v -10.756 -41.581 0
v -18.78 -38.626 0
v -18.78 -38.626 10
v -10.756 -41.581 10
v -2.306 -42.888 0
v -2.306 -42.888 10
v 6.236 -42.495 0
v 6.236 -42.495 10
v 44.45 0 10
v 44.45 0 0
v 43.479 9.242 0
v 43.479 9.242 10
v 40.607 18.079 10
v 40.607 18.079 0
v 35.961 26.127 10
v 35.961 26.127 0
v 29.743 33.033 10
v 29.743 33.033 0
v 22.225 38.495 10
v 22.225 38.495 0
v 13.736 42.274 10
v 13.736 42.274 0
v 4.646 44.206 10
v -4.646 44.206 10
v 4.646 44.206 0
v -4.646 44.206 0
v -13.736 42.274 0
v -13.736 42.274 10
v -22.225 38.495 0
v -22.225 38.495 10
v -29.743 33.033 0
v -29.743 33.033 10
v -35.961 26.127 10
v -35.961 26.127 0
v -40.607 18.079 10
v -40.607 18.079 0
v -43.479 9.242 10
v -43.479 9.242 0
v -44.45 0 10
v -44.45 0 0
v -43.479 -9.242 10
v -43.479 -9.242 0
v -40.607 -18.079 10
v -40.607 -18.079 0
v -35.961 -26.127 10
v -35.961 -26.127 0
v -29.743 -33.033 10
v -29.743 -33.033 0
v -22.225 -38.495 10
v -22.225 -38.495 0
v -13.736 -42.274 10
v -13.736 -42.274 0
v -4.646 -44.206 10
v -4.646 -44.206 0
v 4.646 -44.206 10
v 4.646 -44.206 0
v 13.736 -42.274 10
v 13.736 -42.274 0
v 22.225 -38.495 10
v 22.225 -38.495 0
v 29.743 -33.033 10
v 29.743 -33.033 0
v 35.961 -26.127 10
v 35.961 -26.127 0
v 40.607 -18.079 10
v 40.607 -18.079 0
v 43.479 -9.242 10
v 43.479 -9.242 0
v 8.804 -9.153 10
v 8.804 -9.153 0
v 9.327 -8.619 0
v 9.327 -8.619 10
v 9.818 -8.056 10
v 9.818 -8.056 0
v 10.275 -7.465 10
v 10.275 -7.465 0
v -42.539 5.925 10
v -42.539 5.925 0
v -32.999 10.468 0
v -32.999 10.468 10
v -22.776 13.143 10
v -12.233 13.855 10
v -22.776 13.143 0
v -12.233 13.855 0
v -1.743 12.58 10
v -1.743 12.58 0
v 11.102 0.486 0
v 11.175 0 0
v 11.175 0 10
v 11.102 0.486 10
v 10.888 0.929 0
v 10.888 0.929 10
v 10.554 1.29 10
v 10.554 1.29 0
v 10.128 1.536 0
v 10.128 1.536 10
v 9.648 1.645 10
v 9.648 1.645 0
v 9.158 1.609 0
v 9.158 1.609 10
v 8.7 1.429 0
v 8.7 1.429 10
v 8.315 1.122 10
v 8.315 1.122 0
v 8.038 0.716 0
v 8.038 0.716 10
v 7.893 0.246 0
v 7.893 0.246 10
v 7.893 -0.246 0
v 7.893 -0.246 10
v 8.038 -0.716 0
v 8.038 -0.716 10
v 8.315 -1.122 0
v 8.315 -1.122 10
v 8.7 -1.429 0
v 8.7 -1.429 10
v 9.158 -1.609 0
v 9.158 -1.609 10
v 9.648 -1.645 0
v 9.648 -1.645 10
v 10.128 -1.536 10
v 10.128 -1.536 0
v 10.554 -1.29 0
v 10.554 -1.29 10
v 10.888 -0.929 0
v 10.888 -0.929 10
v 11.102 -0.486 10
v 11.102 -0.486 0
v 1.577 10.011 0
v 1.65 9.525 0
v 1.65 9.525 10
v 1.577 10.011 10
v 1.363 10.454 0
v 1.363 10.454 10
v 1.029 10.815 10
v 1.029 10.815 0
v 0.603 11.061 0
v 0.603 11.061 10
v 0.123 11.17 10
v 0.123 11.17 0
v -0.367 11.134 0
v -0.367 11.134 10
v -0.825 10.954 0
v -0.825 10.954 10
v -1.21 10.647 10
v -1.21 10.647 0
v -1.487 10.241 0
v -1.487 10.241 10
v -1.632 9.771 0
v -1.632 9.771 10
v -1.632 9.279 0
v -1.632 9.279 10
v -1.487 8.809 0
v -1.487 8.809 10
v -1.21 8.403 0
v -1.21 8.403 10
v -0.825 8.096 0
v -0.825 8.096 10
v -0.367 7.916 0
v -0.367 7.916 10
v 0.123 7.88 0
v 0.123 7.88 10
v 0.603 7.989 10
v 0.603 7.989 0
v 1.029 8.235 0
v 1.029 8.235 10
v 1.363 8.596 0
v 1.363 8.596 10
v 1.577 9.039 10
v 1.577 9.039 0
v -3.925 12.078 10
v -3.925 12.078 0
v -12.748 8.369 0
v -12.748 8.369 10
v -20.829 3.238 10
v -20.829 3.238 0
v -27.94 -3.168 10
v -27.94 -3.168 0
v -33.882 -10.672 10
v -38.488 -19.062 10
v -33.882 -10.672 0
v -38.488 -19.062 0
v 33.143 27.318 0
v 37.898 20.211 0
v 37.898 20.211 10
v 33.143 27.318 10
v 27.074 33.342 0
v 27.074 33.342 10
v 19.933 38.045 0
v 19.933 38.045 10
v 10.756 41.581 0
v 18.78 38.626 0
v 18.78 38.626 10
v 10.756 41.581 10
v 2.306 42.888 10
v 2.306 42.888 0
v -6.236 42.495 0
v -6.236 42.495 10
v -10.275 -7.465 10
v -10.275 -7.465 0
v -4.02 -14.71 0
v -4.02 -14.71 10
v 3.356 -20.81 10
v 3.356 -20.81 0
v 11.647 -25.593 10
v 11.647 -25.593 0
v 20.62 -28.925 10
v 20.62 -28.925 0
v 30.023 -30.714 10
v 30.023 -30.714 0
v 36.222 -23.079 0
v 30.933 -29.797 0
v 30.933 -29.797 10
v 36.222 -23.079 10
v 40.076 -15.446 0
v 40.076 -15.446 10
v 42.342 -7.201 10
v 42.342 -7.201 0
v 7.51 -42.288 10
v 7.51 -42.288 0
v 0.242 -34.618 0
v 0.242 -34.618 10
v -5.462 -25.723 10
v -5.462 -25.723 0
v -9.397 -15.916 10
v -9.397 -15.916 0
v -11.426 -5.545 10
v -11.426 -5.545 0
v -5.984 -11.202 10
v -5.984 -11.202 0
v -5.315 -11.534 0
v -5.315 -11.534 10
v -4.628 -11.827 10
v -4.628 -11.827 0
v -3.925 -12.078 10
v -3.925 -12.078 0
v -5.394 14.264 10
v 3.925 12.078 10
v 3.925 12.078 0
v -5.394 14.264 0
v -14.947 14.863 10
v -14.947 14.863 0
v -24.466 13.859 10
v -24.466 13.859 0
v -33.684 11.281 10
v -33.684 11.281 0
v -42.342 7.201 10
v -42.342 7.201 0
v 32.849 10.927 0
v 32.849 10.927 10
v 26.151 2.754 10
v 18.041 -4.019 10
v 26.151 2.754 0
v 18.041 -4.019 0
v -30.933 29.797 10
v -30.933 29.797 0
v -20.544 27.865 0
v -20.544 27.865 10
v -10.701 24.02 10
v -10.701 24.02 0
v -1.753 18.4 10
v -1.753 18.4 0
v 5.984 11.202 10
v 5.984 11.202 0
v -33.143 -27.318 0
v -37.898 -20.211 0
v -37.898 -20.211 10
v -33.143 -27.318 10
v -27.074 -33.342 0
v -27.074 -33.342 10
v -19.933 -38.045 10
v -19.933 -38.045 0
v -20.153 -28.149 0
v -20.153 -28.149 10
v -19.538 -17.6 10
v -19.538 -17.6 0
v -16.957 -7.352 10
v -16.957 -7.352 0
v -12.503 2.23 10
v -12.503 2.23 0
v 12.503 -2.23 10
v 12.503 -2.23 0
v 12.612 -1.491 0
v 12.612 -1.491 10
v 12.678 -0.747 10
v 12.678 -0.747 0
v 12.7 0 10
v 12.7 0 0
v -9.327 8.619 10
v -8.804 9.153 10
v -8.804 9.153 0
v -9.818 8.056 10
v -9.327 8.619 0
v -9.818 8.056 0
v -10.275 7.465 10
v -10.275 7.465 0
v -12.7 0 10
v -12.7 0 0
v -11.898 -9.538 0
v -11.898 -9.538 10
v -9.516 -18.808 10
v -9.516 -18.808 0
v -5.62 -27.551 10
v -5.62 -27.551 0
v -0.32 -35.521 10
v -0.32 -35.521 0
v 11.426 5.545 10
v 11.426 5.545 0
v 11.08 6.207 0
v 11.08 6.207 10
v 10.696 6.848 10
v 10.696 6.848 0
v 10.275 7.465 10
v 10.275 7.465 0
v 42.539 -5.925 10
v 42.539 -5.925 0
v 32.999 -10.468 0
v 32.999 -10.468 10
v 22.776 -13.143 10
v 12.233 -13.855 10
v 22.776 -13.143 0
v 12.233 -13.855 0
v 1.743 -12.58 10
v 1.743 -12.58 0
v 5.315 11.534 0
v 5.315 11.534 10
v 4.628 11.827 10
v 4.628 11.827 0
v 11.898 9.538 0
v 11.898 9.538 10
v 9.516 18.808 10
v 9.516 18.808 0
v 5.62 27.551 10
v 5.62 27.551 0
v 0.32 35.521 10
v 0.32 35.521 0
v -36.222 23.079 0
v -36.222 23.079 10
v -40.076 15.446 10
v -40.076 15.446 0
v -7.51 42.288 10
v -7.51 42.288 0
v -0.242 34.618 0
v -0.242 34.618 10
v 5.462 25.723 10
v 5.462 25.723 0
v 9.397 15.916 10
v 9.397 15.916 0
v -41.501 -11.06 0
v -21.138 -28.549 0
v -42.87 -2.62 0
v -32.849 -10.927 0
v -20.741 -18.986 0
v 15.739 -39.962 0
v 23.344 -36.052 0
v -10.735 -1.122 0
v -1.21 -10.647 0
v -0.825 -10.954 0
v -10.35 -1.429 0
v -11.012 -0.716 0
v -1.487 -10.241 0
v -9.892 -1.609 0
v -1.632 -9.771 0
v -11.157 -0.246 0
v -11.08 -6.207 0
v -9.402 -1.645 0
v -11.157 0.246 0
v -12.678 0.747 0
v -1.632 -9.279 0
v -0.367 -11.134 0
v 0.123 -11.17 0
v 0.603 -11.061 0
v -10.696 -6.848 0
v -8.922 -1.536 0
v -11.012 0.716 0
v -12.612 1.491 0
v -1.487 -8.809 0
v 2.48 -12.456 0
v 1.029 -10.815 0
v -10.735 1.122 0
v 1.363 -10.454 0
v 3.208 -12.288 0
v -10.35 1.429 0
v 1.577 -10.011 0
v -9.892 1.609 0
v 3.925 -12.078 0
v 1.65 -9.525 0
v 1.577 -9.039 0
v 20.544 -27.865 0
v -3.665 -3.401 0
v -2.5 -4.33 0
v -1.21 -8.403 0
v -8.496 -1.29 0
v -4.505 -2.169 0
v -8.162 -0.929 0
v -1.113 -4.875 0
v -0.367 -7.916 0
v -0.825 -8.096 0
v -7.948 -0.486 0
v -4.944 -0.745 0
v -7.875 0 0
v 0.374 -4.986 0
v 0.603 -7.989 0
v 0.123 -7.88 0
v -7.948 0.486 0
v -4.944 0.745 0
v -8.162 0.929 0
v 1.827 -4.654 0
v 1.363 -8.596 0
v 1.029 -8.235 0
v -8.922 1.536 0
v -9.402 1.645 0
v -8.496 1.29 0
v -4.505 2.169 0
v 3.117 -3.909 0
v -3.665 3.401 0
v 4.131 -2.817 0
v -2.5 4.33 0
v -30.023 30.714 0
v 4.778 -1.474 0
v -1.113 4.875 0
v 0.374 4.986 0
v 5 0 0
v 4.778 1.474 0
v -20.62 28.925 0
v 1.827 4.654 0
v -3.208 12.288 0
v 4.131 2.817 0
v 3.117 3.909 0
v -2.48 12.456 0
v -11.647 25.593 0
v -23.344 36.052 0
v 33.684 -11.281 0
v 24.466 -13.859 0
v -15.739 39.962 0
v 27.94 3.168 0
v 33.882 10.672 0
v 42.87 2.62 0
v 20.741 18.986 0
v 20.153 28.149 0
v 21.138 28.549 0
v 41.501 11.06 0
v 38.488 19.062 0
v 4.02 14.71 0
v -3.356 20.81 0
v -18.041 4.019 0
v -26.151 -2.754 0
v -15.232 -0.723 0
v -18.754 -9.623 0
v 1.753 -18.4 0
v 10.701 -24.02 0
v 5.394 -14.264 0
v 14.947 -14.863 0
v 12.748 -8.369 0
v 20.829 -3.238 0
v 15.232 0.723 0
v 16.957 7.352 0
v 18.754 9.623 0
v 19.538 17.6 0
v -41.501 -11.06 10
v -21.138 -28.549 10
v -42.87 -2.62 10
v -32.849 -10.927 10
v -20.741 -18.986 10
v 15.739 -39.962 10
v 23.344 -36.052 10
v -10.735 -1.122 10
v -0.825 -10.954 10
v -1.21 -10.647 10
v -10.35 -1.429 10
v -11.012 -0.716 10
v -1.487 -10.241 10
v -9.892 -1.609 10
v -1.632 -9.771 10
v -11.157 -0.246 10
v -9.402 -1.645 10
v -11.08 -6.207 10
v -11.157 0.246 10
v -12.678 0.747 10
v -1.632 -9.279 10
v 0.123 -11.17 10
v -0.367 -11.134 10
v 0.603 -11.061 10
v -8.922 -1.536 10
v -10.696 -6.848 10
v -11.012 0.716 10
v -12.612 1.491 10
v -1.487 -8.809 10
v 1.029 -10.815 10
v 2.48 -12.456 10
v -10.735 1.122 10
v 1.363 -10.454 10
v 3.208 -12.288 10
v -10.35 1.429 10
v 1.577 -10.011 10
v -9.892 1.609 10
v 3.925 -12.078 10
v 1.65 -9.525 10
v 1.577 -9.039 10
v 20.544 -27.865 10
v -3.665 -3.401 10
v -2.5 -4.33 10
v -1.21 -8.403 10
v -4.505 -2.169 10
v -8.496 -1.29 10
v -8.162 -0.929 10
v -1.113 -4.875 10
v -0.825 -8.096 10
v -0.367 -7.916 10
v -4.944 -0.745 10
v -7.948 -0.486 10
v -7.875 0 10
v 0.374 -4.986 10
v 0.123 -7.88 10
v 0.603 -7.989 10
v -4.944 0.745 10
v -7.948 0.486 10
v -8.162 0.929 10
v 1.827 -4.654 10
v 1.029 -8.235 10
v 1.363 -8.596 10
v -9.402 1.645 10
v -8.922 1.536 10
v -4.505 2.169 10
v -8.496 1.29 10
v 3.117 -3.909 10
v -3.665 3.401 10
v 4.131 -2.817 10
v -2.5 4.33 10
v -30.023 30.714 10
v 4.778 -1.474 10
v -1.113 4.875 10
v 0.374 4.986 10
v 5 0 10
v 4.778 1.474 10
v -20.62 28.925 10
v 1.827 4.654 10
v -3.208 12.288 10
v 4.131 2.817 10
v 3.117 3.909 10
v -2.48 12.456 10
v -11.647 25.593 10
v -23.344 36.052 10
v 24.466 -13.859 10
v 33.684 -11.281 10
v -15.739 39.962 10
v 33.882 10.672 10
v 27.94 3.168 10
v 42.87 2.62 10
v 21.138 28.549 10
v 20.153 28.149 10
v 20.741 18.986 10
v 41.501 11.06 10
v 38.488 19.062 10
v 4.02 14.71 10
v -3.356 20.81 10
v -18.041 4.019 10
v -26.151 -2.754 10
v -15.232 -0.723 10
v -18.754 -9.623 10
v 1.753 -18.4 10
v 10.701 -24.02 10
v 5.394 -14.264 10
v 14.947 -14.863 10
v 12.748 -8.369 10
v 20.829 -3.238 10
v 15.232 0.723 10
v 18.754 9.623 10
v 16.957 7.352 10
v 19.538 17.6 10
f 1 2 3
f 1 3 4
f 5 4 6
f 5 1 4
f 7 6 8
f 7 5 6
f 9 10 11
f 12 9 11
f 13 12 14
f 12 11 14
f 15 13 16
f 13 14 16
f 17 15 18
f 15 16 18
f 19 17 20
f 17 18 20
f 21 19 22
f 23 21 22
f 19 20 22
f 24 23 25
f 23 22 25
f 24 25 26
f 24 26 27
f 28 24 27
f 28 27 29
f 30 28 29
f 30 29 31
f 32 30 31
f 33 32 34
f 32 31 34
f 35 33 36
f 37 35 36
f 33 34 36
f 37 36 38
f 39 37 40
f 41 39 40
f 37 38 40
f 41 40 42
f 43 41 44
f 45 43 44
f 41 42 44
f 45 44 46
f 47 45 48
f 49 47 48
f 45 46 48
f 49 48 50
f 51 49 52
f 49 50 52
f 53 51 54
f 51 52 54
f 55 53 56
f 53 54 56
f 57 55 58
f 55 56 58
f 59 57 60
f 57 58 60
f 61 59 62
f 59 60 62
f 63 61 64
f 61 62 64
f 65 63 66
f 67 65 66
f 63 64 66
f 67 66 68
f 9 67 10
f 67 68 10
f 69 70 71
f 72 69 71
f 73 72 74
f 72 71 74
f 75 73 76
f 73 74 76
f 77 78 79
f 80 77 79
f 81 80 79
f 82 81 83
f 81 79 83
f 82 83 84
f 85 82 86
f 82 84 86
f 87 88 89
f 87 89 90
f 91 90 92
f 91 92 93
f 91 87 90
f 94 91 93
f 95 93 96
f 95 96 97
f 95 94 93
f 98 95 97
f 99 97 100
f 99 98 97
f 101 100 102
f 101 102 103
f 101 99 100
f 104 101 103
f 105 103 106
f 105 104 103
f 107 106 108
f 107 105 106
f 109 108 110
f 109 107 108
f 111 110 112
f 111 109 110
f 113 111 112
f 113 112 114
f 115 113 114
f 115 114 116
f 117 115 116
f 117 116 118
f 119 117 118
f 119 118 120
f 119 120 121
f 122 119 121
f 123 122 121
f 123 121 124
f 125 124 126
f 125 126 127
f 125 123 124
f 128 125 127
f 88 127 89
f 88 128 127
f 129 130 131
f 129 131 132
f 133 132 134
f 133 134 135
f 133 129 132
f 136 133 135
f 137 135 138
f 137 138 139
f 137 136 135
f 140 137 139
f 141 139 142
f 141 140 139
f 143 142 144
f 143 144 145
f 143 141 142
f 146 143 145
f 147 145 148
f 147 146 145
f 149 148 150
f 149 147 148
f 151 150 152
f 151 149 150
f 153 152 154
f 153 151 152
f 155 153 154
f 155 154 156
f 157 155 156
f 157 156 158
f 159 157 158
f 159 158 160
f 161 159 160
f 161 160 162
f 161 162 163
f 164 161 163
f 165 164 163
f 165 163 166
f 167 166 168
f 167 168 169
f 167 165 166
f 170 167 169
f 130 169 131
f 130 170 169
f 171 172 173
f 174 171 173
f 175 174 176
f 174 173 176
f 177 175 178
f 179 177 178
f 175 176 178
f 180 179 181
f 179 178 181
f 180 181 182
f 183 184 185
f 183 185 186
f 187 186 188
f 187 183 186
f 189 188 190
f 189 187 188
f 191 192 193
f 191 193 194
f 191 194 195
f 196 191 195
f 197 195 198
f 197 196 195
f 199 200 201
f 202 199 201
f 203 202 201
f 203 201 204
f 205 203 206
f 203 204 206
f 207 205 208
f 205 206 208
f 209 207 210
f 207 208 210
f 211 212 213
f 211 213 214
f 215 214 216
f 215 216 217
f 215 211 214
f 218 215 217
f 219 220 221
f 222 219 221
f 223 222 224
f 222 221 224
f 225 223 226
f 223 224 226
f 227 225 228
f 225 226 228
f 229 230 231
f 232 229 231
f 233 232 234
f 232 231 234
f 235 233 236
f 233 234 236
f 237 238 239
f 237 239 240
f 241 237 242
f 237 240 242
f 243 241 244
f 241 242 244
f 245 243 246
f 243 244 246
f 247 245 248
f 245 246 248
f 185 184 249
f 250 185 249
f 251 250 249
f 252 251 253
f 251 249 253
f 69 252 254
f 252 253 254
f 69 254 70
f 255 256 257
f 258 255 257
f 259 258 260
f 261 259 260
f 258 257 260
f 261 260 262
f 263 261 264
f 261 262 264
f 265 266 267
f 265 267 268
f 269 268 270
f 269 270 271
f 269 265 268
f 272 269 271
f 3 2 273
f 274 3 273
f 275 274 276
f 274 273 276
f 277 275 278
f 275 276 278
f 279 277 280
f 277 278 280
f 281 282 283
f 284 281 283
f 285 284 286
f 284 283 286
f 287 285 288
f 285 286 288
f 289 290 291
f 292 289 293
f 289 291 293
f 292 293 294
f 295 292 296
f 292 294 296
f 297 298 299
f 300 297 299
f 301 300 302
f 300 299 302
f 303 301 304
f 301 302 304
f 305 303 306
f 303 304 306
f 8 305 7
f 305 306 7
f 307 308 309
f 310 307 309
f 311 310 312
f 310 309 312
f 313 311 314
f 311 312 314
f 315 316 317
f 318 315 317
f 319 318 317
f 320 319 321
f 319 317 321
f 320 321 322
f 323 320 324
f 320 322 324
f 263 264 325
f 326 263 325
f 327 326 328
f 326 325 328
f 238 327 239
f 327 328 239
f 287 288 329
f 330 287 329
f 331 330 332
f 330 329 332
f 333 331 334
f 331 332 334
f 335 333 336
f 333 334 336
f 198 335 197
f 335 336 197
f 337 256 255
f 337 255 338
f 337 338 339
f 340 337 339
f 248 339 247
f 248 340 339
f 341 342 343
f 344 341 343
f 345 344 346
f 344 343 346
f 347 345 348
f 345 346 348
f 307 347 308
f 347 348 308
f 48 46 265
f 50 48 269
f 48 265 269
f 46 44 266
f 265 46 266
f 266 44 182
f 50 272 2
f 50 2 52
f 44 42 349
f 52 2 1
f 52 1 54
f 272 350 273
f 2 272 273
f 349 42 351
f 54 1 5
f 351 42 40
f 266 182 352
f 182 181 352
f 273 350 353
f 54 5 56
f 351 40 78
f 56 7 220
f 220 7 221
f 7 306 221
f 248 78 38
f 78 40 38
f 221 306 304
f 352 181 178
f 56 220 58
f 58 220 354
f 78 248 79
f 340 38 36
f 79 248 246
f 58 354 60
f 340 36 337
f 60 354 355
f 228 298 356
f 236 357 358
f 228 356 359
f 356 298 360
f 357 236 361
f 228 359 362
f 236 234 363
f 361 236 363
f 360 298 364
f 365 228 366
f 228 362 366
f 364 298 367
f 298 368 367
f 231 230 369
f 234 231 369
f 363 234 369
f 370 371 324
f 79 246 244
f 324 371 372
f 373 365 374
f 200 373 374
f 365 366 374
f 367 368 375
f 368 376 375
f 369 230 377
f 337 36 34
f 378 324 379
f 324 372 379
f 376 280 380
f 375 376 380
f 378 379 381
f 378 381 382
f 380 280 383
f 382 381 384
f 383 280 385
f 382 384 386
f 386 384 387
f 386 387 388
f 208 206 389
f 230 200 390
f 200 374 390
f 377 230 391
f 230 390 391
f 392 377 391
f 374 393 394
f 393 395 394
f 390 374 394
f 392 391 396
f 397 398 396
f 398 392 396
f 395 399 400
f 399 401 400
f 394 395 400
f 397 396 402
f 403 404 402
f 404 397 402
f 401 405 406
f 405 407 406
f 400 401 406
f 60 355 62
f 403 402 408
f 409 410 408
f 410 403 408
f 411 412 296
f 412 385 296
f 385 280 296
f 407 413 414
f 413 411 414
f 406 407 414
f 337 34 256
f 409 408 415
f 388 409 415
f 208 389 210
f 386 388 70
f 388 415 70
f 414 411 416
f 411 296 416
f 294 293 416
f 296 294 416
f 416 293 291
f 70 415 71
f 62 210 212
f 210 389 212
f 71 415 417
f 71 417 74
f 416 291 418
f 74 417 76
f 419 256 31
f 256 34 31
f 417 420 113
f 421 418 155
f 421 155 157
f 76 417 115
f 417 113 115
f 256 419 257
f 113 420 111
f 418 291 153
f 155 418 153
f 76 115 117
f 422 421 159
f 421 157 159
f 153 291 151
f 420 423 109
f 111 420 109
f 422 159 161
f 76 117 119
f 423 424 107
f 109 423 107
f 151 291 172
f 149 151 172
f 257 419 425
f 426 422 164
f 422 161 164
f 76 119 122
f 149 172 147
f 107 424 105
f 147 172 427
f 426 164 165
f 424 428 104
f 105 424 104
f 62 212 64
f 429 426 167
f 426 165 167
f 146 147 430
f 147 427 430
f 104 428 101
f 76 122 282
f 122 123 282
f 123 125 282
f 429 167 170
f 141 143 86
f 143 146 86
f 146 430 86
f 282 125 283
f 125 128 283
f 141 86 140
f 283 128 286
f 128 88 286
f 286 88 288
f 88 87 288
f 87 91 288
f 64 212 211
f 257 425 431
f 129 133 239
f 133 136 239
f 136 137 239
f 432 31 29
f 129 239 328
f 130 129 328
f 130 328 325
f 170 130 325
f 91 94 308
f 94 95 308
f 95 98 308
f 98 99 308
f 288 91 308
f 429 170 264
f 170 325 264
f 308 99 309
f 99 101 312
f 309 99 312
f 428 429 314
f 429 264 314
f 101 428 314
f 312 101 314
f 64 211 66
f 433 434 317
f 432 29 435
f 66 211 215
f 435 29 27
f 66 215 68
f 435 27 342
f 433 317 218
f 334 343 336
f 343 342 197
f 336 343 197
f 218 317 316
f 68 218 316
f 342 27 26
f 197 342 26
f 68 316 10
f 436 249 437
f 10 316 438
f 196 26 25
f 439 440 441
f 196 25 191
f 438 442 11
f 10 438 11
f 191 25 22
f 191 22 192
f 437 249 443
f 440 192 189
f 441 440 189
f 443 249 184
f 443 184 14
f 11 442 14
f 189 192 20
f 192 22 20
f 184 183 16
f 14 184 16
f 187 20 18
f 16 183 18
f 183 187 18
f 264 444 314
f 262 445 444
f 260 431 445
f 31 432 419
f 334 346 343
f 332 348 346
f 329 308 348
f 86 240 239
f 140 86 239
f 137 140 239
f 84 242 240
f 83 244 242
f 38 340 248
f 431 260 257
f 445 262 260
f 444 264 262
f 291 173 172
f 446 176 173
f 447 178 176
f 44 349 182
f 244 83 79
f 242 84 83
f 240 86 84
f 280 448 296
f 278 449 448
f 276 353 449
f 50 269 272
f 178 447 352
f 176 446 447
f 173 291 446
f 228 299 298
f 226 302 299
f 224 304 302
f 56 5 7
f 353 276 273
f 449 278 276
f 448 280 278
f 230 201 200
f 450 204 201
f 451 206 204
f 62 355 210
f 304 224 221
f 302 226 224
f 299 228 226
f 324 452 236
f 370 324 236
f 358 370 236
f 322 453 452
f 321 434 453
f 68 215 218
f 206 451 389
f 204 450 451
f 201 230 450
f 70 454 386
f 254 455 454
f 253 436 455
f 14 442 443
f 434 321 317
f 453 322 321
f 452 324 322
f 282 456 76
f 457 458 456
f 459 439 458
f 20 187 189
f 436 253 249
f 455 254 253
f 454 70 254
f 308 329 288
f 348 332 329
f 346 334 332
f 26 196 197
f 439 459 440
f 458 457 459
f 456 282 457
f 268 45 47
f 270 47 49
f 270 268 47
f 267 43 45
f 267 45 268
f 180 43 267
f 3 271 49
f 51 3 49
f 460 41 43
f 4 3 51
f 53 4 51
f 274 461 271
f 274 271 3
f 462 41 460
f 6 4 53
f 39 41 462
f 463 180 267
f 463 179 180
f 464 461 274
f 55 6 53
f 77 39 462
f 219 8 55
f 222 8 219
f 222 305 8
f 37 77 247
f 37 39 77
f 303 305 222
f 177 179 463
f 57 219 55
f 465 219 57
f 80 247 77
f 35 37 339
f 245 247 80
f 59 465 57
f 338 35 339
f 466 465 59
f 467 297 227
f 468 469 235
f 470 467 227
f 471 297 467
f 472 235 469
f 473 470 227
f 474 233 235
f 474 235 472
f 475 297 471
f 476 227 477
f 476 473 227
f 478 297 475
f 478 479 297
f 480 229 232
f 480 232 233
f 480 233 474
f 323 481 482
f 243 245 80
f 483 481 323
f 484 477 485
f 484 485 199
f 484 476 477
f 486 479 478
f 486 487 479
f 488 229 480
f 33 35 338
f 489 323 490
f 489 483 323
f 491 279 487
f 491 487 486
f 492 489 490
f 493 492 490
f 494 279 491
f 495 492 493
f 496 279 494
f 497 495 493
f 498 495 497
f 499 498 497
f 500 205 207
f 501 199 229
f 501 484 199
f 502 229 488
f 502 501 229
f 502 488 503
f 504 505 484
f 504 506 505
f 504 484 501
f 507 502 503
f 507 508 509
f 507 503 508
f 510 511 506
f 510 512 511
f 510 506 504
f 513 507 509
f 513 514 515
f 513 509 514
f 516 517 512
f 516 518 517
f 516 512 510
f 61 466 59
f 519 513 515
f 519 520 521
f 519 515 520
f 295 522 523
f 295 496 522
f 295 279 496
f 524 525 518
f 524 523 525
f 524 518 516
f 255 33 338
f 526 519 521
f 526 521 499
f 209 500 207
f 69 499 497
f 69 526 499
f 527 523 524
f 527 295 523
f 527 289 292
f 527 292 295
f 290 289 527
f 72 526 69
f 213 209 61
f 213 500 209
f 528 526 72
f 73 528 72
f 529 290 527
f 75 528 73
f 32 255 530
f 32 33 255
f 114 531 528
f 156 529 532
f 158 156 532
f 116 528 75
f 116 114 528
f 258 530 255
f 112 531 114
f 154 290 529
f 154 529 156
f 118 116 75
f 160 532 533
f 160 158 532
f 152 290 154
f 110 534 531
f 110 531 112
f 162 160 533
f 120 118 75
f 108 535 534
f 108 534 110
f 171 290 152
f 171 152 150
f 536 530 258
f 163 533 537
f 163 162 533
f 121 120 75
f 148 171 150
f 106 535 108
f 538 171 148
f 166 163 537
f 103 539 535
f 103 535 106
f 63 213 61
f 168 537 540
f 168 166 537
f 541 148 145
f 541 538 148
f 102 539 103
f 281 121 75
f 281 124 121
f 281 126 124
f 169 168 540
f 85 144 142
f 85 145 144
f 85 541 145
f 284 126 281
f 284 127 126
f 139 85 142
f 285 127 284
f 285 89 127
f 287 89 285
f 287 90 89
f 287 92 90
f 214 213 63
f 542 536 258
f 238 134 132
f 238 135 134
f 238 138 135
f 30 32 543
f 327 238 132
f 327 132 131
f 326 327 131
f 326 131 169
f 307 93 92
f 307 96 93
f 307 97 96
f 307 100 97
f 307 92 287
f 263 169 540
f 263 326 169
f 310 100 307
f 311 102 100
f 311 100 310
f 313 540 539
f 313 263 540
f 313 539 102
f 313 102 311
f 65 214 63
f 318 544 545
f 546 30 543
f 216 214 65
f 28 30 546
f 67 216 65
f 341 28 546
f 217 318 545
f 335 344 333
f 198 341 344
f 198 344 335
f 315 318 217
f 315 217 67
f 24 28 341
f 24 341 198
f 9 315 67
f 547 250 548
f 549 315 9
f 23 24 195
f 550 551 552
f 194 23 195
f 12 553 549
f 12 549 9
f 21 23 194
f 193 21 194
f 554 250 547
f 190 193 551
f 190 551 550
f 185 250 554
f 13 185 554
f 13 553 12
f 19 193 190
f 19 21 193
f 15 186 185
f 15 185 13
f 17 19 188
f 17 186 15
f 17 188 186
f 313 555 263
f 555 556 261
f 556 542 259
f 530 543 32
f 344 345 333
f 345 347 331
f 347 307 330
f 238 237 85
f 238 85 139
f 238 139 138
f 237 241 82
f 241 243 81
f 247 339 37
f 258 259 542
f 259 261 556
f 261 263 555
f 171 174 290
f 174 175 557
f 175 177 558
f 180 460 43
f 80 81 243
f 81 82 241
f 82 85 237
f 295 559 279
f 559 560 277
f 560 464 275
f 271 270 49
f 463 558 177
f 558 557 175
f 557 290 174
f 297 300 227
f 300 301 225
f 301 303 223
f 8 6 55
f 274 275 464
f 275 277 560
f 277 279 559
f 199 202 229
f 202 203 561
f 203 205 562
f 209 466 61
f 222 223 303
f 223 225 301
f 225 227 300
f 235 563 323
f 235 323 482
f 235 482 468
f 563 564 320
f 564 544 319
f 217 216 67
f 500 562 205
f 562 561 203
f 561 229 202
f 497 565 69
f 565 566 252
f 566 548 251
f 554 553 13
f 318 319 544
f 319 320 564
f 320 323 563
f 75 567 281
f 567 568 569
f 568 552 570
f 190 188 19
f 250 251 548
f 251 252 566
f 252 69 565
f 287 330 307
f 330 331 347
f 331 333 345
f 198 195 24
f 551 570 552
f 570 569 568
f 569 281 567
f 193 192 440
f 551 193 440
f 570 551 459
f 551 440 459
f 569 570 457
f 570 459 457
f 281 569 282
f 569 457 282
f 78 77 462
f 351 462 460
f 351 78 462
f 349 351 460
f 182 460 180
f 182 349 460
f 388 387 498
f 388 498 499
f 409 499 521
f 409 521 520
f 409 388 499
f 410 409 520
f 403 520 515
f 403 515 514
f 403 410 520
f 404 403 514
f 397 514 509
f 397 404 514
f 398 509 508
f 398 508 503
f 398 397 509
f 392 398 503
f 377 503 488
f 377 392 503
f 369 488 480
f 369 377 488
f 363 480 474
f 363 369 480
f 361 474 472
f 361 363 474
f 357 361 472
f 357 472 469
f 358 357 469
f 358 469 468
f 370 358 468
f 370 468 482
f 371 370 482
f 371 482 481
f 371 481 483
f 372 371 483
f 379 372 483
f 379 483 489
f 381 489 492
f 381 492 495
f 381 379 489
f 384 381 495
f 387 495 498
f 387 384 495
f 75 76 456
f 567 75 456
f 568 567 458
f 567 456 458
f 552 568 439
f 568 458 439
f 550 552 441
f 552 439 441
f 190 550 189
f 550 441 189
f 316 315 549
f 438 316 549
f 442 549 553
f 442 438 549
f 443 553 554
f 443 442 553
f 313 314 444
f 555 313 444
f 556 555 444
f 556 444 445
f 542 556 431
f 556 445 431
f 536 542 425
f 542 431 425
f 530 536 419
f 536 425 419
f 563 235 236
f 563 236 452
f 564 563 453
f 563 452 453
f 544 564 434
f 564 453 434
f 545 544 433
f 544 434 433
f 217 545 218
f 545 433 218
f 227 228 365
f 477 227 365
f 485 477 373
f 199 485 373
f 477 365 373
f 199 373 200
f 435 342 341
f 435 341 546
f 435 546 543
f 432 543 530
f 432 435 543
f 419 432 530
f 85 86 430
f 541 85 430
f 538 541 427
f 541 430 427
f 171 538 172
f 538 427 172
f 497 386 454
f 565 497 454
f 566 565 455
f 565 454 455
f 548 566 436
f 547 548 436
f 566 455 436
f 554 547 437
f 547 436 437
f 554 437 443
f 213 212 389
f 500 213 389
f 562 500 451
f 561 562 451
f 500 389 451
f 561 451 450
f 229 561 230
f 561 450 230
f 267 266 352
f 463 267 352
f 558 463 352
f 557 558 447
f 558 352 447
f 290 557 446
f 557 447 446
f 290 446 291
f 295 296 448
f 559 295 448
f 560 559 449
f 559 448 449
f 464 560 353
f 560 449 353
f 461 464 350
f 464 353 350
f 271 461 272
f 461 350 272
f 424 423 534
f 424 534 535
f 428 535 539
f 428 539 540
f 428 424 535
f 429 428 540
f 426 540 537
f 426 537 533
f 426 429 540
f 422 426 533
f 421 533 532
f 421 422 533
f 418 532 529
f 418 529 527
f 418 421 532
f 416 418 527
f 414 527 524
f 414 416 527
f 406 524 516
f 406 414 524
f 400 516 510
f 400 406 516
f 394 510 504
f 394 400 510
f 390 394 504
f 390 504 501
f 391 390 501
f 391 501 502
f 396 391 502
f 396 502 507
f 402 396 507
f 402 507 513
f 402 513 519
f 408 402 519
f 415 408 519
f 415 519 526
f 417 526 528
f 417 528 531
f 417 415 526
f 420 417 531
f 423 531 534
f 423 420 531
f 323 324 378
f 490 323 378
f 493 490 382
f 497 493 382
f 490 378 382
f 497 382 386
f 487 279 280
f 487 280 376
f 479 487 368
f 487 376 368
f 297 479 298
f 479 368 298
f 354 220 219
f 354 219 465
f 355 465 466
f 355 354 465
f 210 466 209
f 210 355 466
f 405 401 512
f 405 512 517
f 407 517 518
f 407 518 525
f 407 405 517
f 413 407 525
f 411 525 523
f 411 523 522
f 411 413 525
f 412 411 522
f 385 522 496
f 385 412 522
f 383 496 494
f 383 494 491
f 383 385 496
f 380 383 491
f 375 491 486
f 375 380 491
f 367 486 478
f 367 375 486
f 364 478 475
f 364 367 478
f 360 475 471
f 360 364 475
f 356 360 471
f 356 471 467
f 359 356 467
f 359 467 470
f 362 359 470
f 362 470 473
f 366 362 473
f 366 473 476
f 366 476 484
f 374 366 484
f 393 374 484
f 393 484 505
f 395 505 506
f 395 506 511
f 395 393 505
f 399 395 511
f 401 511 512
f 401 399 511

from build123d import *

# Parameters (mm, degrees)
SKETCH1_R           = 44.45
SKETCH1_R_2         = 42.95
SKETCH1_R_3         = 12.7
SKETCH1_R_4         = 1.65
SKETCH1_R_5         = 5
BOSS_EXTRUDE1_DEPTH = 10


with BuildPart() as part:
    # Sketch1 → Boss-Extrude1 (new body)
    # profile 1 of 12: a face of its own
    with BuildSketch(Plane.XY):
        Circle(SKETCH1_R)
        Circle(SKETCH1_R_2, mode=Mode.SUBTRACT)
    # profile 2 of 12: a face of its own
    with BuildSketch(Plane.XY):
        with BuildLine():
            ThreePointArc((-1.742936184, 12.579832012), (1.119230316, 12.650585896), (3.924515829, 12.078417757))
            ThreePointArc((3.924515829, 12.078417757), (-19.72755965, 14.560574413), (-42.342066264, 7.20082804))
            ThreePointArc((-42.342066264, 7.20082804), (-42.445514325, 6.563597619), (-42.539372889, 5.924884318))
            ThreePointArc((-42.539372889, 5.924884318), (-22.775826214, 13.143048835), (-1.742936184, 12.579832012))
        make_face()
    # profile 3 of 12: a face of its own
    with BuildSketch(Plane.XY):
        with BuildLine():
            ThreePointArc((-8.804304726, 9.1528257), (-6.530351476, 10.892406052), (-3.924515829, 12.078417757))
            ThreePointArc((-3.924515829, 12.078417757), (-24.518421919, 0.184183522), (-38.487991711, -19.062449843))
            ThreePointArc((-38.487991711, -19.062449843), (-38.197128306, -19.638785328), (-37.897635221, -20.210683923))
            ThreePointArc((-37.897635221, -20.210683923), (-26.151320743, -2.754344892), (-8.804304726, 9.1528257))
        make_face()
    # profile 4 of 12: a face of its own
    with BuildSketch(Plane.XY):
        with BuildLine():
            ThreePointArc((-12.50272811, 2.229751063), (-11.685560963, 4.973697316), (-10.274515829, 7.464872704))
            ThreePointArc((-10.274515829, 7.464872704), (-19.944080366, -14.262559214), (-19.932812483, -38.044519796))
            ThreePointArc((-19.932812483, -38.044519796), (-19.358737547, -38.339819778), (-18.780288992, -38.626457842))
            ThreePointArc((-18.780288992, -38.626457842), (-19.537899599, -17.599672487), (-12.50272811, 2.229751063))
        make_face()
    # profile 5 of 12: a face of its own
    with BuildSketch(Plane.XY):
        with BuildLine():
            ThreePointArc((7.510489314, -42.28823773), (-5.461664877, -25.722523382), (-11.425534308, -5.545012694))
            ThreePointArc((-11.425534308, -5.545012694), (-12.377283339, -2.844794745), (-12.7, 0))
            ThreePointArc((-12.7, 0), (-7.751777987, -23.261489097), (6.236023622, -42.494876272))
            ThreePointArc((6.236023622, -42.494876272), (6.874032975, -42.396346195), (7.510489314, -42.28823773))
        make_face()
    # profile 6 of 12: a face of its own
    with BuildSketch(Plane.XY):
        with BuildLine():
            ThreePointArc((30.932515974, -29.797348129), (10.700740193, -24.020244623), (-5.98417474, -11.201770069))
            ThreePointArc((-5.98417474, -11.201770069), (-8.341304168, -9.576671905), (-10.274515829, -7.464872704))
            ThreePointArc((-10.274515829, -7.464872704), (7.401440109, -23.375320774), (30.022910658, -30.71363436))
            ThreePointArc((30.022910658, -30.71363436), (30.481156541, -30.258909364), (30.932515974, -29.797348129))
        make_face()
    # profile 7 of 12: a face of its own
    with BuildSketch(Plane.XY):
        with BuildLine():
            ThreePointArc((42.539372889, -5.924884318), (22.775826214, -13.143048835), (1.742936184, -12.579832012))
            ThreePointArc((1.742936184, -12.579832012), (-1.119230316, -12.650585896), (-3.924515829, -12.078417757))
            ThreePointArc((-3.924515829, -12.078417757), (19.72755965, -14.560574413), (42.342066264, -7.20082804))
            ThreePointArc((42.342066264, -7.20082804), (42.445514325, -6.563597619), (42.539372889, -5.924884318))
        make_face()
    # profile 8 of 12: a face of its own
    with BuildSketch(Plane.XY):
        with BuildLine():
            ThreePointArc((37.897635221, 20.210683923), (26.151320743, 2.754344892), (8.804304726, -9.1528257))
            ThreePointArc((8.804304726, -9.1528257), (6.530351476, -10.892406052), (3.924515829, -12.078417757))
            ThreePointArc((3.924515829, -12.078417757), (24.518421919, -0.184183522), (38.487991711, 19.062449843))
            ThreePointArc((38.487991711, 19.062449843), (38.197128306, 19.638785328), (37.897635221, 20.210683923))
        make_face()
    # profile 9 of 12: a face of its own
    with BuildSketch(Plane.XY):
        with BuildLine():
            ThreePointArc((18.780288992, 38.626457842), (19.537899599, 17.599672487), (12.50272811, -2.229751063))
            ThreePointArc((12.50272811, -2.229751063), (11.685560963, -4.973697316), (10.274515829, -7.464872704))
            ThreePointArc((10.274515829, -7.464872704), (19.944080366, 14.262559214), (19.932812483, 38.044519796))
            ThreePointArc((19.932812483, 38.044519796), (19.358737547, 38.339819778), (18.780288992, 38.626457842))
        make_face()
    # profile 10 of 12: a face of its own
    with BuildSketch(Plane.XY):
        with BuildLine():
            ThreePointArc((11.425534308, 5.545012694), (12.377283339, 2.844794745), (12.7, 0))
            ThreePointArc((12.7, 0), (7.751777987, 23.261489097), (-6.236023622, 42.494876272))
            ThreePointArc((-6.236023622, 42.494876272), (-6.874032975, 42.396346195), (-7.510489314, 42.28823773))
            ThreePointArc((-7.510489314, 42.28823773), (5.461664877, 25.722523382), (11.425534308, 5.545012694))
        make_face()
    # profile 11 of 12: a face of its own
    with BuildSketch(Plane.XY):
        with BuildLine():
            ThreePointArc((5.98417474, 11.201770069), (8.341304168, 9.576671905), (10.274515829, 7.464872704))
            ThreePointArc((10.274515829, 7.464872704), (-7.401440109, 23.375320774), (-30.022910658, 30.71363436))
            ThreePointArc((-30.022910658, 30.71363436), (-30.481156541, 30.258909364), (-30.932515974, 29.797348129))
            ThreePointArc((-30.932515974, 29.797348129), (-10.700740193, 24.020244623), (5.98417474, 11.201770069))
        make_face()
    # profile 12 of 12: a face of its own
    with BuildSketch(Plane.XY):
        Circle(SKETCH1_R_3)
        with Locations((-9.525, 0)):
            Circle(SKETCH1_R_4, mode=Mode.SUBTRACT)
        with Locations((9.525, 0)):
            Circle(SKETCH1_R_4, mode=Mode.SUBTRACT)
        with Locations((0, -9.525)):
            Circle(SKETCH1_R_4, mode=Mode.SUBTRACT)
        with Locations((0, 9.525)):
            Circle(SKETCH1_R_4, mode=Mode.SUBTRACT)
        Circle(SKETCH1_R_5, mode=Mode.SUBTRACT)
    extrude(amount=BOSS_EXTRUDE1_DEPTH)


solid = part.part
